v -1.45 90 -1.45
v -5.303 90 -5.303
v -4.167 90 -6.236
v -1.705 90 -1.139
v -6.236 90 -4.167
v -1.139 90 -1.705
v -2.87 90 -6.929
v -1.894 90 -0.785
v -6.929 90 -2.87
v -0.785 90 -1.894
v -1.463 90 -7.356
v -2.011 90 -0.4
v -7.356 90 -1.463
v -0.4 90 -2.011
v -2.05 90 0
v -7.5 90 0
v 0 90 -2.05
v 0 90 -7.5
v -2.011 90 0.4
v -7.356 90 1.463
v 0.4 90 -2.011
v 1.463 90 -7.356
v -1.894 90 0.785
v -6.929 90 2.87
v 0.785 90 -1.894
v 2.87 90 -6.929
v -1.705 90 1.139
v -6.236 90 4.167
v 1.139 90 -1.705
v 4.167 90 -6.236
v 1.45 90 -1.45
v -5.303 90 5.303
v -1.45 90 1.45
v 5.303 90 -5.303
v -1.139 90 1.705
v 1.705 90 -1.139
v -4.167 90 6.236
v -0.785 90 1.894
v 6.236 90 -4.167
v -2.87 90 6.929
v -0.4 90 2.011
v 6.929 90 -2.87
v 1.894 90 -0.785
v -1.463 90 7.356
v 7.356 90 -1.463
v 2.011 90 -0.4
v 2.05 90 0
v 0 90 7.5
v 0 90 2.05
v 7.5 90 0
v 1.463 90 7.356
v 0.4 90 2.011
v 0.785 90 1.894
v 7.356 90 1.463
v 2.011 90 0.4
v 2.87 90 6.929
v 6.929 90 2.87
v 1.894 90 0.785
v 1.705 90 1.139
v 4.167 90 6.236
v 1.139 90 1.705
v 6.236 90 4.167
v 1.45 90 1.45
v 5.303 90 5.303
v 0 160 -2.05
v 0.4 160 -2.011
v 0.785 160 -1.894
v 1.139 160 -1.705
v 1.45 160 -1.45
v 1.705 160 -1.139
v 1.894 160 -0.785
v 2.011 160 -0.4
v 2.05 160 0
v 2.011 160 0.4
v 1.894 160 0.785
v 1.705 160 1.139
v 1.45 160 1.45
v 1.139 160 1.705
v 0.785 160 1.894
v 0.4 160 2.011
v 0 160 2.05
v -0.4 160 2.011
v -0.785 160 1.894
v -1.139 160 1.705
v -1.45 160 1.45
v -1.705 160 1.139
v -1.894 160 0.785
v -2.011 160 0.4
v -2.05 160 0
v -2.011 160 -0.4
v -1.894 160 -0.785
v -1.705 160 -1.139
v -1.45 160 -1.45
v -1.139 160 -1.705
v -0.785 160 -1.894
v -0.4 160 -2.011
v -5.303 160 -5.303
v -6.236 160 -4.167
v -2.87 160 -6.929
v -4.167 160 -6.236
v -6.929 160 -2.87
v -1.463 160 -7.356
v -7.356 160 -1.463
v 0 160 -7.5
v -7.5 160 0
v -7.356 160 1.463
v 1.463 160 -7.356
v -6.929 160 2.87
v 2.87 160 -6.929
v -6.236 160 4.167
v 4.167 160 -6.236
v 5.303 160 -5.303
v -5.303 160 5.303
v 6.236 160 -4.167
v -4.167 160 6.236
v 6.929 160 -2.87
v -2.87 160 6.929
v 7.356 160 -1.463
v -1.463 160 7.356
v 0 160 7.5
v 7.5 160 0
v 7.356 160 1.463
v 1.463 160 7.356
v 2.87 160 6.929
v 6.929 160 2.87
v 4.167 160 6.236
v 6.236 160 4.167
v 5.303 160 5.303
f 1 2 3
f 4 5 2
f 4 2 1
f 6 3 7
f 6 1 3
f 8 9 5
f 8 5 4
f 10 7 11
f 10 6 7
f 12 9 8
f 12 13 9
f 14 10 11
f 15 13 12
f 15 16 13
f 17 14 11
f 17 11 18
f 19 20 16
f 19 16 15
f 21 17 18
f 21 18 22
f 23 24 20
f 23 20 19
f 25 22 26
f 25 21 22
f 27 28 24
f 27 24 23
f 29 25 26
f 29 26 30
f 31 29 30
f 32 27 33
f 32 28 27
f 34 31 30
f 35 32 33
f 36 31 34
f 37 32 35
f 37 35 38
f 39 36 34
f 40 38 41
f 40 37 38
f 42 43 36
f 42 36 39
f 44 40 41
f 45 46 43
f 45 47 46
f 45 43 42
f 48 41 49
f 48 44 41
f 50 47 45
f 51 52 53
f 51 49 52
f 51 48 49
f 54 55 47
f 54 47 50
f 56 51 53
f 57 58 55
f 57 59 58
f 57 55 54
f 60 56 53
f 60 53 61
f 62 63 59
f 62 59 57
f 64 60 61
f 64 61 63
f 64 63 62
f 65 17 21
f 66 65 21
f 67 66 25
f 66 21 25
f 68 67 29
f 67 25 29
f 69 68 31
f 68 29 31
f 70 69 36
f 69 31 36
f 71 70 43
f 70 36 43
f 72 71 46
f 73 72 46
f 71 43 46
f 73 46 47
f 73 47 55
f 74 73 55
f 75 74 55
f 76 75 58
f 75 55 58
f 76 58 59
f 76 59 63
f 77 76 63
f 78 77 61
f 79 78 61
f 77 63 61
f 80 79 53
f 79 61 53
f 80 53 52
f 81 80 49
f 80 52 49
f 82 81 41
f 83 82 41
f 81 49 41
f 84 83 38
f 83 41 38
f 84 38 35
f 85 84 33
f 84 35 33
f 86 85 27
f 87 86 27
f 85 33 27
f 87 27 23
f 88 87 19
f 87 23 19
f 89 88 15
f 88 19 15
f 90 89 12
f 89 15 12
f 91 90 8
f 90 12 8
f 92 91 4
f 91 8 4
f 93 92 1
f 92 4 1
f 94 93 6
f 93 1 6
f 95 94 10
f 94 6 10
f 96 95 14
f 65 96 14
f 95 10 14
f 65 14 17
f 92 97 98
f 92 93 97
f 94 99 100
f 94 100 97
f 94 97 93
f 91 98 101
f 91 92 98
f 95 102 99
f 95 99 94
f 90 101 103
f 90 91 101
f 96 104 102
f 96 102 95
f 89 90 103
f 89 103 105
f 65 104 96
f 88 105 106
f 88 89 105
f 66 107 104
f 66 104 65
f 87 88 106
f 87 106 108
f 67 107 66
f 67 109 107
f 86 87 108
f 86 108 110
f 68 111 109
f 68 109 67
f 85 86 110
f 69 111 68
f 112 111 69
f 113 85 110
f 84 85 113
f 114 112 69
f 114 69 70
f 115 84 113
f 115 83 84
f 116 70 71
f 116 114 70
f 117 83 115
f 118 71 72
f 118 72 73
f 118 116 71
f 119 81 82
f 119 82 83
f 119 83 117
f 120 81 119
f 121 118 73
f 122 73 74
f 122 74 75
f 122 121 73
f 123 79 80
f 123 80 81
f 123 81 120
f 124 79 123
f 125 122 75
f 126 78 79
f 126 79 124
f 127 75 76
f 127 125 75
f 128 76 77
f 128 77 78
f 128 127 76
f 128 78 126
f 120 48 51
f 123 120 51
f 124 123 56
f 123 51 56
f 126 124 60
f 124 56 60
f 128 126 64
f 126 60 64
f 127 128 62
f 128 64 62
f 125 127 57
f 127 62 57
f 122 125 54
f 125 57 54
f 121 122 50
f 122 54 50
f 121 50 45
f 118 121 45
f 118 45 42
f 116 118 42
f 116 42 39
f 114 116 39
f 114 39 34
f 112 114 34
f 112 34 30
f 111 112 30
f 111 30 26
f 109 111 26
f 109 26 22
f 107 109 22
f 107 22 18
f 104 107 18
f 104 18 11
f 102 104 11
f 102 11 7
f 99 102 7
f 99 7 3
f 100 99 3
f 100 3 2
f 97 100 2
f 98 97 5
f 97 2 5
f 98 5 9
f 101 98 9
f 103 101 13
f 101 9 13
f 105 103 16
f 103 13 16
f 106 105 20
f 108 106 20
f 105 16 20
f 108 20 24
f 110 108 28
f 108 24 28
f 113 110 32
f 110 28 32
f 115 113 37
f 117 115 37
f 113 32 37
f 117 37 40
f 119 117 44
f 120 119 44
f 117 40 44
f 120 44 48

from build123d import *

# Parameters (mm, degrees)
SKETCH1_R           = 7.5
EXTRUSION1_DEPTH    = 160
SKETCH2_R           = 2.25
EXTRUSION2_DEPTH    = 80
SKETCH4_R           = 9.988310786
EXTRUSION4_DEPTH    = 45
SKETCH5_R           = 7.5
SKETCH5_R_2         = 4
EXTRUSION5_DEPTH    = 15
SKETCH6_R           = 13.00139778
CUT_EXTRUDE1_DEPTH  = 45
SKETCH7_R           = 4.639288825
SKETCH7_R_2         = 2.05
BOSS_EXTRUDE1_DEPTH = 70


with BuildPart() as part:
    # Sketch1 → Extrusion1 (new body)
    with BuildSketch(Plane(origin=(0, 0, 0), x_dir=(-1, 0, 0), z_dir=(0, 1, 0))):
        with Locations(Location((0, 0, 0), (0, 0, 90))):
            Circle(SKETCH1_R)
    extrude(amount=EXTRUSION1_DEPTH)

    # Sketch2 → Extrusion2 (cut)
    with BuildSketch(Plane(origin=(0, 160, 0), x_dir=(-1, 0, 0), z_dir=(0, 1, 0))):
        with Locations(Location((0, 0, 0), (0, 0, 90))):
            Circle(SKETCH2_R)
    extrude(amount=-EXTRUSION2_DEPTH, mode=Mode.SUBTRACT)

    # Sketch4 → Extrusion4 (cut)
    with BuildSketch(Plane.XZ):
        Circle(SKETCH4_R)
    extrude(amount=-EXTRUSION4_DEPTH, mode=Mode.SUBTRACT)

    # Sketch5 → Extrusion5 (cut)
    with BuildSketch(Plane.XZ.offset(-45)):
        with Locations(Location((0, 0, 0), (0, 0, 270))):
            Circle(SKETCH5_R)
        with Locations(Location((0, 0, 0), (0, 0, 270))):
            Circle(SKETCH5_R_2, mode=Mode.SUBTRACT)
    extrude(amount=-EXTRUSION5_DEPTH, mode=Mode.SUBTRACT)

    # Sketch6 → Cut-Extrude1 (cut)
    with BuildSketch(Plane.XZ.offset(-45)):
        Circle(SKETCH6_R)
    extrude(amount=-CUT_EXTRUDE1_DEPTH, mode=Mode.SUBTRACT)

    # Sketch7 → Boss-Extrude1 (add)
    with BuildSketch(Plane.XZ.offset(-90)):
        Circle(SKETCH7_R)
        with Locations(Location((0, 0, 0), (0, 0, 270))):
            Circle(SKETCH7_R_2, mode=Mode.SUBTRACT)
    extrude(amount=-BOSS_EXTRUDE1_DEPTH)


solid = part.part
